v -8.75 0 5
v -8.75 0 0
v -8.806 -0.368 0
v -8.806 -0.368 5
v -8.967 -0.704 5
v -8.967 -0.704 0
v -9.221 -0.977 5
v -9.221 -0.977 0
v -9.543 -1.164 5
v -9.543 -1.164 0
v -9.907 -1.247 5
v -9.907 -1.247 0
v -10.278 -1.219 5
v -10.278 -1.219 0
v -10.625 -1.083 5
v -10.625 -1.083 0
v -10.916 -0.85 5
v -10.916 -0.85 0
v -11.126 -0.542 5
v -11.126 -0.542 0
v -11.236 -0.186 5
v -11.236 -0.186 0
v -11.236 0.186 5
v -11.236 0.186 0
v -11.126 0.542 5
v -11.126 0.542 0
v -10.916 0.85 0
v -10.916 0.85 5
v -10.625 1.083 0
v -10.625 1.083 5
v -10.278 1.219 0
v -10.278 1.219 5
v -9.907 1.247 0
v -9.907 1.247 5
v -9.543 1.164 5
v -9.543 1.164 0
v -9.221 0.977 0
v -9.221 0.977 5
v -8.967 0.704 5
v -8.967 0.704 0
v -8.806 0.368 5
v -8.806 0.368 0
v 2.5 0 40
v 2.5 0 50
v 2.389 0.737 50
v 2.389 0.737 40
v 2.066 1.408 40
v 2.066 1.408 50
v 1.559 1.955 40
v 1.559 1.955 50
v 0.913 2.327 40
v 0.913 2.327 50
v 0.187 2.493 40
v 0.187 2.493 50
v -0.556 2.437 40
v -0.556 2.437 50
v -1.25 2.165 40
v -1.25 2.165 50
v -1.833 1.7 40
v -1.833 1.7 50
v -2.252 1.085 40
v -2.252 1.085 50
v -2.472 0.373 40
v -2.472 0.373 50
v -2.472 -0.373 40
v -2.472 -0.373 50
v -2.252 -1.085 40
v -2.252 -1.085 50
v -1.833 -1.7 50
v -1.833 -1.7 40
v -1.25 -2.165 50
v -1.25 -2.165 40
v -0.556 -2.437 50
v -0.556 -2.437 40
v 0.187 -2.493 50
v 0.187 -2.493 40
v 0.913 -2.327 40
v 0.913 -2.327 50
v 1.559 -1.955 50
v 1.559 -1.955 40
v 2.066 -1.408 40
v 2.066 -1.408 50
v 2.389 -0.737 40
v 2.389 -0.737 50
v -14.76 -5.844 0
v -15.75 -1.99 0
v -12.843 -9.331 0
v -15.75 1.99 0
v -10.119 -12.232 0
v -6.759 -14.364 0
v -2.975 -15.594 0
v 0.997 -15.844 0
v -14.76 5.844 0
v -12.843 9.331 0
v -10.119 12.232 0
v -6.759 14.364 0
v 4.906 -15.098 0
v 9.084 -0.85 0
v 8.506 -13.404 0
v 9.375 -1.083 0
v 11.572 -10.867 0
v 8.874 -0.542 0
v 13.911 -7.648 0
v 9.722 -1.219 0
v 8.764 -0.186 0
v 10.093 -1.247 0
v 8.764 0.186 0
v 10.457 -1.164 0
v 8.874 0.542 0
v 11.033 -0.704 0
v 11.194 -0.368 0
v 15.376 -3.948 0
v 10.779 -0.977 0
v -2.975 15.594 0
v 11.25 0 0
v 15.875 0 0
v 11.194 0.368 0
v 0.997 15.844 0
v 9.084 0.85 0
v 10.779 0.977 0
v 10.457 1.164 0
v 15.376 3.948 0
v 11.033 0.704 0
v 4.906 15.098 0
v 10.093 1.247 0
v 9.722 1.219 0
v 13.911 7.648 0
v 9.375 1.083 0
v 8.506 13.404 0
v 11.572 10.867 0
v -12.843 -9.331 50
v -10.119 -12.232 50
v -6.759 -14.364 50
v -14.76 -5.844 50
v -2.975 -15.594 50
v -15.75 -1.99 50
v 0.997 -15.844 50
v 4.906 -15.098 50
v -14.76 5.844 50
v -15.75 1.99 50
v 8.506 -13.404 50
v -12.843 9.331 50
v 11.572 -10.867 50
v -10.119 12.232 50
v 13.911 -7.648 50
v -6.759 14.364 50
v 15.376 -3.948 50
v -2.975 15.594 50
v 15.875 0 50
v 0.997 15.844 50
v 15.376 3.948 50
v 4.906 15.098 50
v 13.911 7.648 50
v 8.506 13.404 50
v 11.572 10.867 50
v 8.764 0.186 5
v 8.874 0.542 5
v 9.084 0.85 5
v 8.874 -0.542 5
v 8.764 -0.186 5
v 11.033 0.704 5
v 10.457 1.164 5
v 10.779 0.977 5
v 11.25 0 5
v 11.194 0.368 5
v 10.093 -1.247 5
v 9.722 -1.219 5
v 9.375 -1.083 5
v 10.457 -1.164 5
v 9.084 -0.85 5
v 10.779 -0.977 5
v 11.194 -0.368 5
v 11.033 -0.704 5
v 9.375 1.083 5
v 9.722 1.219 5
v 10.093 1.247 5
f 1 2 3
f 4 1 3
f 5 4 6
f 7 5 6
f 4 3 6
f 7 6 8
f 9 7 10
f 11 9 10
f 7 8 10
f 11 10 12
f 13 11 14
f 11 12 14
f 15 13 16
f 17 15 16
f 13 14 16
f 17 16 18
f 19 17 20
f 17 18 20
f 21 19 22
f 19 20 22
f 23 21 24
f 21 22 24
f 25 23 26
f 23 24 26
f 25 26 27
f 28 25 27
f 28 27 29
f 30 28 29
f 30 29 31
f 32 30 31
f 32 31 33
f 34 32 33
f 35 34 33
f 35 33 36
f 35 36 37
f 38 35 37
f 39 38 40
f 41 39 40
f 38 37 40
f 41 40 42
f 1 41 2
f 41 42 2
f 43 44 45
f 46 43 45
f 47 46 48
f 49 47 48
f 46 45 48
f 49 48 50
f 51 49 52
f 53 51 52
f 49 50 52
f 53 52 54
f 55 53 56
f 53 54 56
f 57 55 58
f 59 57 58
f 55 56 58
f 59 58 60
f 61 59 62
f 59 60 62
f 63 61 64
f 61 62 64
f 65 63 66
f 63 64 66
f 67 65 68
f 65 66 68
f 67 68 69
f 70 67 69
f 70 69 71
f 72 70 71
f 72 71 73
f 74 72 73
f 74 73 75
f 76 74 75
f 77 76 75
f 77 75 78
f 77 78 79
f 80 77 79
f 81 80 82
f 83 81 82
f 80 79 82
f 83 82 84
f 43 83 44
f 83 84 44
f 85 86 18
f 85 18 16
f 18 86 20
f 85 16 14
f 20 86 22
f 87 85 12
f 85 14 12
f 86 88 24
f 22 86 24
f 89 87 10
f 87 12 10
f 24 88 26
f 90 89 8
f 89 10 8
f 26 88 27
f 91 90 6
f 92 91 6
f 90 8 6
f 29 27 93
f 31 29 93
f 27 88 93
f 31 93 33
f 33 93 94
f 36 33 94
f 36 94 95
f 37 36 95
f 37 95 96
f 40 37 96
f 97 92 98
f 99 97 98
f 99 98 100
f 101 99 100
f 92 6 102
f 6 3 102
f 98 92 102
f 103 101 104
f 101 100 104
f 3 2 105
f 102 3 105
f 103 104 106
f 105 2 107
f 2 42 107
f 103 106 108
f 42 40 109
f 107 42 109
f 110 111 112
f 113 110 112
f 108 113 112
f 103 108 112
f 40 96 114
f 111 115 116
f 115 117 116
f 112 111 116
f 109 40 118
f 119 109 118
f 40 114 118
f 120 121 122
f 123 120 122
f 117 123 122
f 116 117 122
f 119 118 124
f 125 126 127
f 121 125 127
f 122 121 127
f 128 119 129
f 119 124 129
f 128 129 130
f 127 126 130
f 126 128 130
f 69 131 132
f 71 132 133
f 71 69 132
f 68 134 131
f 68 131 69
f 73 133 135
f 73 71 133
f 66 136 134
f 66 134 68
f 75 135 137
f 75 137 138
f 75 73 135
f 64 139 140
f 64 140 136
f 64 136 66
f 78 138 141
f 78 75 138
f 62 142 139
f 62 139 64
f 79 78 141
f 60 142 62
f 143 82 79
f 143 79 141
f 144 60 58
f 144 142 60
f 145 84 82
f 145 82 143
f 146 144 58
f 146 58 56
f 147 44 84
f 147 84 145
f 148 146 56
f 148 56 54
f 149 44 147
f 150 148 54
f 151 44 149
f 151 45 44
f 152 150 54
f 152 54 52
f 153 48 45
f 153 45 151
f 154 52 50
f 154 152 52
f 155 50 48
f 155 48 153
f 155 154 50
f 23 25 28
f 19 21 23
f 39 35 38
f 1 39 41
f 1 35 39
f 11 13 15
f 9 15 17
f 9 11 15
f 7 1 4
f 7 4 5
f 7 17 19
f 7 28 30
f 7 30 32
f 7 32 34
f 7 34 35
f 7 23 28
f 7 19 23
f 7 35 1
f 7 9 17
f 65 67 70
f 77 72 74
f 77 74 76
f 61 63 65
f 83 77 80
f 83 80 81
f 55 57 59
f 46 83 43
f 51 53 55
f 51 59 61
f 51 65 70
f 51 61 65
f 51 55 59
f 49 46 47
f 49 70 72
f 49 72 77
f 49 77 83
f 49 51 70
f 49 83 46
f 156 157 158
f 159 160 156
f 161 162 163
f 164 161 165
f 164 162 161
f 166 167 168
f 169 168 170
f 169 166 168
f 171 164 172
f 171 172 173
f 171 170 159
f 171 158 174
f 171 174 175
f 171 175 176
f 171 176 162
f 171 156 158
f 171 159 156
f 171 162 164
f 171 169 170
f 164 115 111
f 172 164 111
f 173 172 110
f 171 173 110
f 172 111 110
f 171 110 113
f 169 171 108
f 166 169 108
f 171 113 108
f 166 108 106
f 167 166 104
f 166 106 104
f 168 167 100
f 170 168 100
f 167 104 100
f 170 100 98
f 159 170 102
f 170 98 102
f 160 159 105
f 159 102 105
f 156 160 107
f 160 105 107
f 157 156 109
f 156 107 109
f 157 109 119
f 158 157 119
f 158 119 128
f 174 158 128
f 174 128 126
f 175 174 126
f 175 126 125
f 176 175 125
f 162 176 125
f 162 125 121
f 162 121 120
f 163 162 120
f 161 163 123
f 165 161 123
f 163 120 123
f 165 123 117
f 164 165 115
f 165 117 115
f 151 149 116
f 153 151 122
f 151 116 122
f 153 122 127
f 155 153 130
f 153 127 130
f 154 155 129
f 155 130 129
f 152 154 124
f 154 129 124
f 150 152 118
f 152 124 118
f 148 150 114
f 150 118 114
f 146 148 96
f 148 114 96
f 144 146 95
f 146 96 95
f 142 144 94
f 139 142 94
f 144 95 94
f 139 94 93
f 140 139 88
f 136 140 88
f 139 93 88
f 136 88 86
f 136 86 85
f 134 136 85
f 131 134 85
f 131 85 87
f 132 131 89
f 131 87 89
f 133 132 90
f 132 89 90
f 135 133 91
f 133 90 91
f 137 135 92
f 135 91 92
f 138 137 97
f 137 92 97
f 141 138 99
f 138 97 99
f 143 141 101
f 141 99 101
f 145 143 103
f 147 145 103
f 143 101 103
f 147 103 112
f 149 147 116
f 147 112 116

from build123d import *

# Parameters (mm, degrees)
F0_R     = 15.875
F1_DEPTH = 50
F2_R     = 2.5
F3_DEPTH = 10
F4_R     = 1.25
F5_DEPTH = 5


with BuildPart() as f1:
    # F0 (on Top) → F1 (new body)
    with BuildSketch(Plane.XY):
        Circle(F0_R)
    extrude(amount=F1_DEPTH)

    # F2 (on face) → F3 (cut)
    with BuildSketch(Plane.XY.offset(50)):
        Circle(F2_R)
    extrude(amount=-F3_DEPTH, mode=Mode.SUBTRACT)

    # F4 (on face) → F5 (cut)
    with BuildSketch(Plane(origin=(0, 0, 0), x_dir=(1, 0, 0), z_dir=(0, 0, -1))):
        with Locations((10, 0)):
            Circle(F4_R)
        with Locations((-10, 0)):
            Circle(F4_R)
    extrude(amount=-F5_DEPTH, mode=Mode.SUBTRACT)


solid = f1.part
